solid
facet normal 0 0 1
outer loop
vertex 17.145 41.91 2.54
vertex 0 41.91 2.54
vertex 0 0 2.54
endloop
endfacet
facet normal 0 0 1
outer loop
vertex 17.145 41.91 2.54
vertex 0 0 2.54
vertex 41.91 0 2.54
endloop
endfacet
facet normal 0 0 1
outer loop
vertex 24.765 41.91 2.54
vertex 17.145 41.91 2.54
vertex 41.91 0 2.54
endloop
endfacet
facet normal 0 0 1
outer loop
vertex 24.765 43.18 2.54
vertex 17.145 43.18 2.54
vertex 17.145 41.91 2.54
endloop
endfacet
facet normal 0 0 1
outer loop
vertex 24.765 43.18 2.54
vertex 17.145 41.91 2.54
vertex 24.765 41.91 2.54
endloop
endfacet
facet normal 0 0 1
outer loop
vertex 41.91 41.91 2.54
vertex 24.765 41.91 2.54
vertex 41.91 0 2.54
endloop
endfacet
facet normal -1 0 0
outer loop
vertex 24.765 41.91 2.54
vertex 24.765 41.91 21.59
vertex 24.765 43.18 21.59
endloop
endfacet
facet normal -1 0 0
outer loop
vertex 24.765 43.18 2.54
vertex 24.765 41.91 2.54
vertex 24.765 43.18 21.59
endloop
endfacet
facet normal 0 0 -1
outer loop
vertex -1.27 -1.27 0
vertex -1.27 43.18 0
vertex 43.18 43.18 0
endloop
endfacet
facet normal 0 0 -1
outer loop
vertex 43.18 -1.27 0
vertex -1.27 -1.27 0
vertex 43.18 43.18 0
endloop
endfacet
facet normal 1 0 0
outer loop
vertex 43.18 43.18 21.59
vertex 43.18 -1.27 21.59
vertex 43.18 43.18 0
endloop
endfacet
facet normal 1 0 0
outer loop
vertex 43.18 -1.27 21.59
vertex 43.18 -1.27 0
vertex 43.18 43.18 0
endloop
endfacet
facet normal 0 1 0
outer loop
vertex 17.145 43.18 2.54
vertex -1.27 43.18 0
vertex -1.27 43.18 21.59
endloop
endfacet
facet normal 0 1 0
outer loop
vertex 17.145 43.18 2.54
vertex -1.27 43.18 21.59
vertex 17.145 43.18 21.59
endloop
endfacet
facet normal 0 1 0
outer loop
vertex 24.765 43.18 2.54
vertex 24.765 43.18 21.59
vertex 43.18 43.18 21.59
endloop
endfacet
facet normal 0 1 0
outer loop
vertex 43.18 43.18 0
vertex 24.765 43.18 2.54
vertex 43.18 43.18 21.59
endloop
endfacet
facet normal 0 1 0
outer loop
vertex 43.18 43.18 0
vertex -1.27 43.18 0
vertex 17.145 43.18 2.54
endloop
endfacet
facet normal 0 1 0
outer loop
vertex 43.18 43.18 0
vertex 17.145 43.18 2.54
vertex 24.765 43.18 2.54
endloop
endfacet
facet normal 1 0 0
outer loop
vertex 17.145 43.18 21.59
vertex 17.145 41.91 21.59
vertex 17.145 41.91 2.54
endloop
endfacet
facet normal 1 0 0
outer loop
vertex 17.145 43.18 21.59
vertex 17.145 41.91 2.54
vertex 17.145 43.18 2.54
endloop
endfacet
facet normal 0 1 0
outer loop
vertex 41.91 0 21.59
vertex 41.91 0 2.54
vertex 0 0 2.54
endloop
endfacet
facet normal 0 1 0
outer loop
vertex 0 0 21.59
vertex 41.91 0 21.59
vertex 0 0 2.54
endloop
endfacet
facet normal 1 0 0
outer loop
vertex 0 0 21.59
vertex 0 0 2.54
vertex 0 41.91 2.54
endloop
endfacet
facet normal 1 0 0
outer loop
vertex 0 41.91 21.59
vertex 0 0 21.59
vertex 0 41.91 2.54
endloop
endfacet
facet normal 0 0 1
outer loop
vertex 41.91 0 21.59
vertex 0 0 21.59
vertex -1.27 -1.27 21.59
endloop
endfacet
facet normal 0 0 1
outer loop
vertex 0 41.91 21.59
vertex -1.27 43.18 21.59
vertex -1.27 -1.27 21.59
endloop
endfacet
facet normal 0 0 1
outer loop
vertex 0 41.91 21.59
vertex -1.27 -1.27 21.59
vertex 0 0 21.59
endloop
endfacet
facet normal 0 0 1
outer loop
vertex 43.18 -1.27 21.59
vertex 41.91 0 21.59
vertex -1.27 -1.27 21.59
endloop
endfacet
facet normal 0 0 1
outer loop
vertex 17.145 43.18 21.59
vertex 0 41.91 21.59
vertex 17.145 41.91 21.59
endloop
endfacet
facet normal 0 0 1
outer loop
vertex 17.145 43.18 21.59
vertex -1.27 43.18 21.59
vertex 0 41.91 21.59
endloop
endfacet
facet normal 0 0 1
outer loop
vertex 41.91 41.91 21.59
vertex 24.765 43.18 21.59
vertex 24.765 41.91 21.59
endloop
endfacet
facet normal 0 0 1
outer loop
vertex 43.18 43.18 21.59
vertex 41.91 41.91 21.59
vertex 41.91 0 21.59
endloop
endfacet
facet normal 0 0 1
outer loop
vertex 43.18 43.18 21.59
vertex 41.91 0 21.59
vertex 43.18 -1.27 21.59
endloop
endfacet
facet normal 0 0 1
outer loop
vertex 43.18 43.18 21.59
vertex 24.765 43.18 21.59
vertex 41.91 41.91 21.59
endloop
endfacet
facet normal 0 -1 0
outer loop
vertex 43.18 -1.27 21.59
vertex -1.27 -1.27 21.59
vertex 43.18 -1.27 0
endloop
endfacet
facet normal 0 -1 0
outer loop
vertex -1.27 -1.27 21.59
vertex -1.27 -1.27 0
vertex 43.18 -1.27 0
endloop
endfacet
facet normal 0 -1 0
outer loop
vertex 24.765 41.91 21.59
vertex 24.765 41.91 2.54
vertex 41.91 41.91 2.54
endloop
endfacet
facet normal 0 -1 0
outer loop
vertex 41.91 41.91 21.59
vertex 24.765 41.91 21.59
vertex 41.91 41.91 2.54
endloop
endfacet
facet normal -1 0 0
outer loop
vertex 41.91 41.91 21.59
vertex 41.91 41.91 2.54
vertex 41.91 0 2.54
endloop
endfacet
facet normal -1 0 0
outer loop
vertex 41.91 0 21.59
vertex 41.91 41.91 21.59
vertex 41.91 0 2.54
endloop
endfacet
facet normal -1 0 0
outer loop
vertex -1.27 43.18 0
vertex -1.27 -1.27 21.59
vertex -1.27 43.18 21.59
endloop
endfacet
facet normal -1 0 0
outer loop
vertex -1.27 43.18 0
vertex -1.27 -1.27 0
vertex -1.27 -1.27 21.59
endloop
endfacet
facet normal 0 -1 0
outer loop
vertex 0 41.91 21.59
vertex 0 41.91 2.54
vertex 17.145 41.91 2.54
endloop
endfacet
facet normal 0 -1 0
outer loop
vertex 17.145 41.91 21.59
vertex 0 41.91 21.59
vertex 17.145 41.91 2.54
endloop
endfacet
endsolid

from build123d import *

# Parameters (mm, degrees)
F0_W          = 41.91
F0_H          = 41.91
F1_DEPTH      = 2.54
F2_W          = 44.45
F2_H          = 44.45
F3_DEPTH      = 2.54
F3_DEPTH_BACK = 19.05
F5_W          = 7.62
F5_H          = 1.27
F6_DEPTH      = 19.05


with BuildPart() as f1:
    # F0 (on Top) → F1 (new body)
    with BuildSketch(Plane.XY):
        with Locations((20.955, 20.955)):
            Rectangle(F0_W, F0_H)
    extrude(amount=F1_DEPTH)

    # F2 (on face) → F3 (join, two sides)
    with BuildSketch(Plane.XY.offset(2.54)) as f3_sk:
        with Locations((20.955, 20.955)):
            Rectangle(F2_W, F2_H)
        Polygon((0, 0), (0, 41.91), (20.955, 41.91), (41.91, 41.91), (41.91, 0), align=None, mode=Mode.SUBTRACT)
    extrude(amount=-F3_DEPTH)
    extrude(f3_sk.sketch, amount=F3_DEPTH_BACK)


with BuildPart() as f4_1:
    # F4: copy of F1
    add(f1.part)


with BuildPart() as f6_tool:
    # F5 (on face) → F6 (new body)
    with BuildSketch(Plane.XY.offset(21.59)):
        with Locations((20.955, 42.545)):
            Rectangle(F5_W, F5_H)
    extrude(amount=-F6_DEPTH)


with BuildPart() as f1_1:
    add(f1.part)

    # F6: cut by f6_tool
    add(f6_tool.part, mode=Mode.SUBTRACT)


with BuildPart() as f4_1_1:
    add(f4_1.part)

    # F6: cut by f6_tool
    add(f6_tool.part, mode=Mode.SUBTRACT)


solid = f1_1.part
